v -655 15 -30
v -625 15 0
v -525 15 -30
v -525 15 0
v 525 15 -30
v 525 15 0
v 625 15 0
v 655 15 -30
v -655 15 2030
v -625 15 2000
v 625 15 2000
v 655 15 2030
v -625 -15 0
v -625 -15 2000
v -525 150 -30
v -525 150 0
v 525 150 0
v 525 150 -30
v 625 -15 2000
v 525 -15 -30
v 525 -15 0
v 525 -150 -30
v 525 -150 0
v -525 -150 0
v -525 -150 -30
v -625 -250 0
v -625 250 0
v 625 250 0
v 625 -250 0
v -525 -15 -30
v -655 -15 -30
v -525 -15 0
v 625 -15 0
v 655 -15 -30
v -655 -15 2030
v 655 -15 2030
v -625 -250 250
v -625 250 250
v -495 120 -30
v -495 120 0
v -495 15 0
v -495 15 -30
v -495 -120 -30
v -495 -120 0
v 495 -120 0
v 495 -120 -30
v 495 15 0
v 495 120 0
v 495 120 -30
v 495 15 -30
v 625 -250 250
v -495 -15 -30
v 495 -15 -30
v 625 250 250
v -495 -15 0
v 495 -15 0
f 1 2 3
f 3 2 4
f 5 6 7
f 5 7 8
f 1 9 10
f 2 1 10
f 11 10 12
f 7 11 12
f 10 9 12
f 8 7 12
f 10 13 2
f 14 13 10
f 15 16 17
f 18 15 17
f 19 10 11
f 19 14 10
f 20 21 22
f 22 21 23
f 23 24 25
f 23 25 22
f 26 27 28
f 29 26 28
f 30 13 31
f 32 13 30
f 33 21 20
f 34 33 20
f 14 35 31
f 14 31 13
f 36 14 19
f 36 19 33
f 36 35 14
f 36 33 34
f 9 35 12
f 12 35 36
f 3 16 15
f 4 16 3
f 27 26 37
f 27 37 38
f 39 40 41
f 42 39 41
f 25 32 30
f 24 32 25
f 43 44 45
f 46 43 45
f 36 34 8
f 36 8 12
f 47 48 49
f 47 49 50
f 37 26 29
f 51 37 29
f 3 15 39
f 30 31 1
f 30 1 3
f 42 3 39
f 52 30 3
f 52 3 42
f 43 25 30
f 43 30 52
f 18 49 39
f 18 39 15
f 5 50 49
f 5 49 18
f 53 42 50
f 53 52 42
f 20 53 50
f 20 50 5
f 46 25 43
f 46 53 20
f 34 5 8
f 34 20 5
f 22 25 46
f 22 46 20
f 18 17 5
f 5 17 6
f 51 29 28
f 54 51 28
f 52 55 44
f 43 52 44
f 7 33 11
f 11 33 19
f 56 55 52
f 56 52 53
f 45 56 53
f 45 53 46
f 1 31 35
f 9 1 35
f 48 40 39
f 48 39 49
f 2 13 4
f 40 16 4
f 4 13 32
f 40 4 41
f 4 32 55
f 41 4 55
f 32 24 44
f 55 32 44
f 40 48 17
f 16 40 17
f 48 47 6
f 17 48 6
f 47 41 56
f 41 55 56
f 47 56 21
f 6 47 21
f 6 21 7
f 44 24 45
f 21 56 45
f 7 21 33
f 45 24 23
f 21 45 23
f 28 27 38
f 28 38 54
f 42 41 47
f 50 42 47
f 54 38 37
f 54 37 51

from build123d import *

# Parameters (mm, degrees)
F0_W     = 1250
F0_H     = 500
F1_DEPTH = 250
F2_W     = 1310
F2_H     = 2060
F2_W_2   = 1250
F2_H_2   = 2000
F3_DEPTH = 15
F4_W     = 1050
F4_H     = 300
F4_W_2   = 990
F4_H_2   = 240
F5_DEPTH = 30


with BuildPart() as f1:
    # F0 (on Top) → F1 (new body)
    with BuildSketch(Plane.XY):
        Rectangle(F0_W, F0_H)
    extrude(amount=F1_DEPTH)


with BuildPart() as f3:
    # F2 (on Front) → F3 (new body, symmetric)
    with BuildSketch(Plane.XZ):
        with Locations((0, 1000)):
            Rectangle(F2_W, F2_H)
        with Locations((0, 1000)):
            Rectangle(F2_W_2, F2_H_2, mode=Mode.SUBTRACT)
    extrude(amount=F3_DEPTH, both=True)

    # F4 (on face) → F5 (join)
    with BuildSketch(Plane(origin=(0, 0, 0), x_dir=(1, 0, 0), z_dir=(0, 0, -1))):
        Rectangle(F4_W, F4_H)
        Rectangle(F4_W_2, F4_H_2, mode=Mode.SUBTRACT)
    extrude(amount=F5_DEPTH)


solid = Compound([f1.part, f3.part])
